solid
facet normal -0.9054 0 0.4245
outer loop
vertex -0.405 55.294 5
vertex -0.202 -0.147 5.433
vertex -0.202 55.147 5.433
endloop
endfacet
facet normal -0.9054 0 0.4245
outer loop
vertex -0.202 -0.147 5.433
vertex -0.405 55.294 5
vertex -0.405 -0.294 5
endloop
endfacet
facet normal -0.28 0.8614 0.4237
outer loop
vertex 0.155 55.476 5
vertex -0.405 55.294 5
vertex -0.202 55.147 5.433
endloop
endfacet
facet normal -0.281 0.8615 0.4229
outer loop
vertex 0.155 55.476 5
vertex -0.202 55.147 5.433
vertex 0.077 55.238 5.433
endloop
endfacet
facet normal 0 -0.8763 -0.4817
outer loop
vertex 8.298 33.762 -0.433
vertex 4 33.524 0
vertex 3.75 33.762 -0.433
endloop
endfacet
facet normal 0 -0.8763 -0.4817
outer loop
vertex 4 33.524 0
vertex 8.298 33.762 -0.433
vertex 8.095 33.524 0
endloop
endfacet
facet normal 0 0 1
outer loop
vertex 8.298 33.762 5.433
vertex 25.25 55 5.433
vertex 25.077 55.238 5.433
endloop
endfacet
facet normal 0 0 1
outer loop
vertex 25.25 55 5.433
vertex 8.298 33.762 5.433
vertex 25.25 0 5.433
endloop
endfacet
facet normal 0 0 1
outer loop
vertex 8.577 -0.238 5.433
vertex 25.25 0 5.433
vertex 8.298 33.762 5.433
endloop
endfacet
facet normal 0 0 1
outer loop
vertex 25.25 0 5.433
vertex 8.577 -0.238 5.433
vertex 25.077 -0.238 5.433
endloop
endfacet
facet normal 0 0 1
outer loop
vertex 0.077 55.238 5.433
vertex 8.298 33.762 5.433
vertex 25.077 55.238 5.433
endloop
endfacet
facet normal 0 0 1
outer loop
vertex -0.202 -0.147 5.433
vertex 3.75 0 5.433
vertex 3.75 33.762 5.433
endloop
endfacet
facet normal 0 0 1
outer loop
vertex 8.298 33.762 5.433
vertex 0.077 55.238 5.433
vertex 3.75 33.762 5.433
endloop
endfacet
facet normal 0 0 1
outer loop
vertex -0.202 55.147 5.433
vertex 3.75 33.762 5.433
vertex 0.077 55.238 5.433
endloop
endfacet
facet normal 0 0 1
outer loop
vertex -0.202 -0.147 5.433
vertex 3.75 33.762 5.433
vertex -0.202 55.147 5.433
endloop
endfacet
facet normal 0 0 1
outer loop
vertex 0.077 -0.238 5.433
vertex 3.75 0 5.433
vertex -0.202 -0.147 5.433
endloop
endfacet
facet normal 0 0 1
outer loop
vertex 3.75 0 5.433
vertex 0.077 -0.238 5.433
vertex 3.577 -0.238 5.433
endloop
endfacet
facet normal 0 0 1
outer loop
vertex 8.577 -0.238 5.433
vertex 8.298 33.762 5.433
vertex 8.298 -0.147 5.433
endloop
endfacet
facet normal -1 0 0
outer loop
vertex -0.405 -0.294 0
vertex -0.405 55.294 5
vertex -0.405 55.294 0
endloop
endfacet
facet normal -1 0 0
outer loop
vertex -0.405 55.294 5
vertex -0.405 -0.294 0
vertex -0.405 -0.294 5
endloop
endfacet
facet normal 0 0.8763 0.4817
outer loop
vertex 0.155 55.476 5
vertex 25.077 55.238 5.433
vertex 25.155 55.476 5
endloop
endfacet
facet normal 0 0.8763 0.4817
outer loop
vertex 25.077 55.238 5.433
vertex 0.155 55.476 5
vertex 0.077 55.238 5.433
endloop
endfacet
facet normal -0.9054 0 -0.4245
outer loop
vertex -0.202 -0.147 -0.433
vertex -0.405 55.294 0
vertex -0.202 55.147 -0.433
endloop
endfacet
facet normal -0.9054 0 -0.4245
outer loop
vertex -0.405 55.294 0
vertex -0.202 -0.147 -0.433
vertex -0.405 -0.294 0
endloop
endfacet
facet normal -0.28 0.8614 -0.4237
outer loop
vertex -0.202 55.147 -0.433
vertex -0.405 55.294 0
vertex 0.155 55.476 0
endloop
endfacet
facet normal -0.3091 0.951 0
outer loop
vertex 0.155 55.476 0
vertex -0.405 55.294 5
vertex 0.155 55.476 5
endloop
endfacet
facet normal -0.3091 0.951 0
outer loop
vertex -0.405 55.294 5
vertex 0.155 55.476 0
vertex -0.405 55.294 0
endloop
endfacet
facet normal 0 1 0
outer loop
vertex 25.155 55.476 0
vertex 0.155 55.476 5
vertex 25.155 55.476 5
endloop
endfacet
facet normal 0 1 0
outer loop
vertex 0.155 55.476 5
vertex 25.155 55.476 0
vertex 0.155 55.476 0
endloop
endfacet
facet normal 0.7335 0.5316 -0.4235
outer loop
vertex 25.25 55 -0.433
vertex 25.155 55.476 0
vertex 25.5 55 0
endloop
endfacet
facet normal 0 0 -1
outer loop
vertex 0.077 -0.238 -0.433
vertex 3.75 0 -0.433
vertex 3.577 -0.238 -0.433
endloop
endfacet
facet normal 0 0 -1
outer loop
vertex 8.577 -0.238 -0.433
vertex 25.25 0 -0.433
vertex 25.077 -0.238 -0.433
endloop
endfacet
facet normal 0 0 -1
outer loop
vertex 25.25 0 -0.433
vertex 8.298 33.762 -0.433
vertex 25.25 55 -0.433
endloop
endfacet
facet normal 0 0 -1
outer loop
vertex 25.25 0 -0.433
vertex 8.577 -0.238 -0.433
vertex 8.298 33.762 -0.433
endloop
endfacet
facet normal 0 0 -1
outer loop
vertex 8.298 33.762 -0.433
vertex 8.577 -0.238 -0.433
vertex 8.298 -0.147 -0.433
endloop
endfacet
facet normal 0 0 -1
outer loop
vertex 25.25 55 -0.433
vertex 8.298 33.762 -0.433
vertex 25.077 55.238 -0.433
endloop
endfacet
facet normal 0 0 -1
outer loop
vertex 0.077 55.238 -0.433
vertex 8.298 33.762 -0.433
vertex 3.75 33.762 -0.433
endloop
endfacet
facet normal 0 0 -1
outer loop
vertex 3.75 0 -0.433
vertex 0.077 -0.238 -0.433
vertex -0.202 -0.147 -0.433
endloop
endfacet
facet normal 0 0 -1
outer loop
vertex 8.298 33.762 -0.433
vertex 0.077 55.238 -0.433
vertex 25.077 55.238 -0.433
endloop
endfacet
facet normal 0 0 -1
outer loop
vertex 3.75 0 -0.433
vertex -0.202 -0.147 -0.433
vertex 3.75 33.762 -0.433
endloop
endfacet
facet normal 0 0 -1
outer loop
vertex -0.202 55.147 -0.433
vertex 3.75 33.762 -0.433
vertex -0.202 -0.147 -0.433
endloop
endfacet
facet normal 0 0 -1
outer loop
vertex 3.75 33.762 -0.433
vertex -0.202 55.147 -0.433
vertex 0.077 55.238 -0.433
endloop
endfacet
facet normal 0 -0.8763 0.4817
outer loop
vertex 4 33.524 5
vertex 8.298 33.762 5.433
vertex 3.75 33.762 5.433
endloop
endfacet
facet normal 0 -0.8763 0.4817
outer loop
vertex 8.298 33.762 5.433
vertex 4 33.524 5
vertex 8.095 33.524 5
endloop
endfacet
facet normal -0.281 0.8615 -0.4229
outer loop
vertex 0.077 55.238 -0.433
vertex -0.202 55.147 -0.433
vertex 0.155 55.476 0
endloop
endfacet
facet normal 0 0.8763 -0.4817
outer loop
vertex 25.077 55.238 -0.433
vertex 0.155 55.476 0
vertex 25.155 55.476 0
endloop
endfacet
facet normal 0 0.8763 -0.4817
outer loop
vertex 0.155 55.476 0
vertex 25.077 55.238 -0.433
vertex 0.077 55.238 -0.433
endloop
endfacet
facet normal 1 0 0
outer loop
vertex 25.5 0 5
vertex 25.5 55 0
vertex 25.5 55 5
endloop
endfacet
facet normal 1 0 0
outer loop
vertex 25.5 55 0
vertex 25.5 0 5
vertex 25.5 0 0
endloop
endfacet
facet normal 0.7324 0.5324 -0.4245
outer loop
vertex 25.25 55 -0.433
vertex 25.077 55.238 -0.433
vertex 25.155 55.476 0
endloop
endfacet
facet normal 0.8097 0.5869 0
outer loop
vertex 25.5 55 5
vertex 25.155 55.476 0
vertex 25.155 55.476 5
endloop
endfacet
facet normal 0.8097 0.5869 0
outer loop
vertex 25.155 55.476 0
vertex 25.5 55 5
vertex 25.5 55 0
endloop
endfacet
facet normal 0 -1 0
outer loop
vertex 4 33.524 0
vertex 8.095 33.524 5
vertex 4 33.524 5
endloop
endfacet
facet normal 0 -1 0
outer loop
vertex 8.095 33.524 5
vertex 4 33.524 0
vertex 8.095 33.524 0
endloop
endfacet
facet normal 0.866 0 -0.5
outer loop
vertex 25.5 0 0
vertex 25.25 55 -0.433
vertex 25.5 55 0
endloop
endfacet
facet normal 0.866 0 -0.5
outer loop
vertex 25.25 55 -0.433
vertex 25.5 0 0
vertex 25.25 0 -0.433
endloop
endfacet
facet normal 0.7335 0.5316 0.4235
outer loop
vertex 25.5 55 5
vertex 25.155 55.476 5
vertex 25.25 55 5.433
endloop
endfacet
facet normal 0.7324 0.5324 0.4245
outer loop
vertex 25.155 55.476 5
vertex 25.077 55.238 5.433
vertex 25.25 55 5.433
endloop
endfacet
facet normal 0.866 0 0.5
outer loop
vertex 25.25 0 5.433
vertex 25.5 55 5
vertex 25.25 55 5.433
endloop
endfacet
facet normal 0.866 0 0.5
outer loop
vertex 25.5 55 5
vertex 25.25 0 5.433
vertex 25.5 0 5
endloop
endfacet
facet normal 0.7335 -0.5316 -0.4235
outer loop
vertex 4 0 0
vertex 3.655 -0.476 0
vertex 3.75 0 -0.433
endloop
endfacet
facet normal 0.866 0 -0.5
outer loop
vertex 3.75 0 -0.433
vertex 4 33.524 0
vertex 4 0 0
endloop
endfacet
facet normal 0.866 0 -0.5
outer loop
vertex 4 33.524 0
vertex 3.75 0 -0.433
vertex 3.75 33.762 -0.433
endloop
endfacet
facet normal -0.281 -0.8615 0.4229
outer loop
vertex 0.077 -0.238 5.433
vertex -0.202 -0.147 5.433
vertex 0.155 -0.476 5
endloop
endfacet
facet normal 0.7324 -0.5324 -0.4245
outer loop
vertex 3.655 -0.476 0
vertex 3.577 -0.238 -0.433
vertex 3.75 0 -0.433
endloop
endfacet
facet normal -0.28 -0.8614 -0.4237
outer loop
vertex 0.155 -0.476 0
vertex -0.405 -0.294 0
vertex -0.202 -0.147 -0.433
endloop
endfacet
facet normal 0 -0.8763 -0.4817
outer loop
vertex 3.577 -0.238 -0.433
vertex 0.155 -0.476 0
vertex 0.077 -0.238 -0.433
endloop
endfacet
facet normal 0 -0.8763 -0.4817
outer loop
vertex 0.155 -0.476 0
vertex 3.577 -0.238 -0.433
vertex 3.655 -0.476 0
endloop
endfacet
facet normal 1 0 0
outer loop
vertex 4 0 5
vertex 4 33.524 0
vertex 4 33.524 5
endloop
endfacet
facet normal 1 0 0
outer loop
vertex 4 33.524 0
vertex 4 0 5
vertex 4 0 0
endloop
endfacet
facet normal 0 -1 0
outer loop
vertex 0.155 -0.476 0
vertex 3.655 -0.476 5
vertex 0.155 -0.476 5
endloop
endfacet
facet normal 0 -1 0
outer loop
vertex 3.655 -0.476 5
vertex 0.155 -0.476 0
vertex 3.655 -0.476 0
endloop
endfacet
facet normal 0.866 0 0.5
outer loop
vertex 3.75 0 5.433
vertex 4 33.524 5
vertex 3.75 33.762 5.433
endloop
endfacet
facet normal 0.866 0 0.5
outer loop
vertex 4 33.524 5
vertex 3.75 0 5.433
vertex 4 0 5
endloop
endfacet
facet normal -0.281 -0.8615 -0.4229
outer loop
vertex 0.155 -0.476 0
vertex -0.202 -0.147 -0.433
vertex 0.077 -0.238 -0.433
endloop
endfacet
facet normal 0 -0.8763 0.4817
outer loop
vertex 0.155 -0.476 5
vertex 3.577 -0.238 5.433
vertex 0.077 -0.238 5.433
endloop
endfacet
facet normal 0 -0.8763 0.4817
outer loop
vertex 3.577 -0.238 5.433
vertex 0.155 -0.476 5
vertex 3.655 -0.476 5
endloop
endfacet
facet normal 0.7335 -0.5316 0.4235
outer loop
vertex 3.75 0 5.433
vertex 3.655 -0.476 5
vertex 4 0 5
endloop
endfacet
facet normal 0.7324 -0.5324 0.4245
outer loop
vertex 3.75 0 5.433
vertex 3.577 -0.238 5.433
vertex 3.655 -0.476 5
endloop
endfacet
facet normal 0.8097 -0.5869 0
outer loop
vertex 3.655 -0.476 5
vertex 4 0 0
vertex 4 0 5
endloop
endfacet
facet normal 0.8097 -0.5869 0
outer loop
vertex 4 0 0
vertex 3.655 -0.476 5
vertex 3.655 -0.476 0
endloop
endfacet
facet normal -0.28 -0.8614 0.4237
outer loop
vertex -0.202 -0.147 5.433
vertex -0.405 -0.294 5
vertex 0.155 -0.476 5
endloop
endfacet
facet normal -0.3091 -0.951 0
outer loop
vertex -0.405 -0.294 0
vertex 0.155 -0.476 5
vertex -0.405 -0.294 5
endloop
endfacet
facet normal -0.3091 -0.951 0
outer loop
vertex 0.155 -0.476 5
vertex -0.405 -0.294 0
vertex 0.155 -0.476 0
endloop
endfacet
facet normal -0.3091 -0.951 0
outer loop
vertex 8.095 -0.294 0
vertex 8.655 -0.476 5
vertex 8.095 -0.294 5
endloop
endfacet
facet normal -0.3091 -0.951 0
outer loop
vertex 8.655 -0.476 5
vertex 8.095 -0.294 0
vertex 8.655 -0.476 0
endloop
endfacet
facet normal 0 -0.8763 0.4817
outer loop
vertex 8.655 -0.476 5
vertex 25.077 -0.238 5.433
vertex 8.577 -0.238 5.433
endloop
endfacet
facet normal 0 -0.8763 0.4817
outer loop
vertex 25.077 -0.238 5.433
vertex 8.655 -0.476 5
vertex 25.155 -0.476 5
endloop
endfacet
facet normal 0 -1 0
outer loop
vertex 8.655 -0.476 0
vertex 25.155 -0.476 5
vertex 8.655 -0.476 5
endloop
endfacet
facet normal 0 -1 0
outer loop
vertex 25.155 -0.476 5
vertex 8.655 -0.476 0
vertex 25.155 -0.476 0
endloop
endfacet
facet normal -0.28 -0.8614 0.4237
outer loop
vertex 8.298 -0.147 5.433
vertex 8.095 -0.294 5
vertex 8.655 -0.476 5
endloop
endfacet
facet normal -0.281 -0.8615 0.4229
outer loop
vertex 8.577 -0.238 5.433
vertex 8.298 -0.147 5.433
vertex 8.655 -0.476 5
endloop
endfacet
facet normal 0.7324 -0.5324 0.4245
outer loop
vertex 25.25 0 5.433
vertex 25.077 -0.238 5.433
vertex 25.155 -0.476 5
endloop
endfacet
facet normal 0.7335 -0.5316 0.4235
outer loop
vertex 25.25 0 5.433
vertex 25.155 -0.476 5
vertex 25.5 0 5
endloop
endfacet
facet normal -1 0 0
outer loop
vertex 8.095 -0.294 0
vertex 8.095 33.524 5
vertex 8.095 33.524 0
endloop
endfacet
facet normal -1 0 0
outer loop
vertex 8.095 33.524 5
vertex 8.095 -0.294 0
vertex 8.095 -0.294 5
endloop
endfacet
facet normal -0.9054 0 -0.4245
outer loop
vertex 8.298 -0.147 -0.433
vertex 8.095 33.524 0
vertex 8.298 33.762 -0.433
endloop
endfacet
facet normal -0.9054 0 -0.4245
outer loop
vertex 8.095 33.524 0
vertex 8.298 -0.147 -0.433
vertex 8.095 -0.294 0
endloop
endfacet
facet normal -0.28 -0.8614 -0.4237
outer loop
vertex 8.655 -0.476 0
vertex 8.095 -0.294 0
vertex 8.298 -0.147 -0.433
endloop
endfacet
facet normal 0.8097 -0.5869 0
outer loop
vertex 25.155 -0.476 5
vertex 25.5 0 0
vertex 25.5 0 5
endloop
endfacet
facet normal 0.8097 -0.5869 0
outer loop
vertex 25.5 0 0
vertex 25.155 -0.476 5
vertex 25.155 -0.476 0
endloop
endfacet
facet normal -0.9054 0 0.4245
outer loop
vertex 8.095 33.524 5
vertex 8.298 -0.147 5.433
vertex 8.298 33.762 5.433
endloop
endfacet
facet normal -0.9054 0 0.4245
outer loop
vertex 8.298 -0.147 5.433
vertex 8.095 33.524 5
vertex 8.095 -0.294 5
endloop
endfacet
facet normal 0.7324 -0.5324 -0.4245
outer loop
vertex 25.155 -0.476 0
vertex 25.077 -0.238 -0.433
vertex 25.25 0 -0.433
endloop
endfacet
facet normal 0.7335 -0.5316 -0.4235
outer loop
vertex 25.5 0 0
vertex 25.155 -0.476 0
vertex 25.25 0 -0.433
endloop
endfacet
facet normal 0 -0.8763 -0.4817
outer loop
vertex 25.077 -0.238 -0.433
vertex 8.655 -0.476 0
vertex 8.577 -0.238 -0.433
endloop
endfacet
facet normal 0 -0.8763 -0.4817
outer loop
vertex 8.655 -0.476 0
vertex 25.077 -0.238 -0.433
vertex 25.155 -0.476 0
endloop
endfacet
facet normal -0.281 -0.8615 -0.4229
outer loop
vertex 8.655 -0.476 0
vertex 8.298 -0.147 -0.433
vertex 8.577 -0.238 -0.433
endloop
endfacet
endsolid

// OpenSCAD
// Tested; fit to my saw. Casting tolerances vary.
/**/
 minkowski(){
  difference(){
    union(){
      cube([25,55,5]);
      }
    union(){
      translate([3.5,-1,-1])
        cube([5,35,7]);
      }
    }
  sphere(.5);
  }
/**/
